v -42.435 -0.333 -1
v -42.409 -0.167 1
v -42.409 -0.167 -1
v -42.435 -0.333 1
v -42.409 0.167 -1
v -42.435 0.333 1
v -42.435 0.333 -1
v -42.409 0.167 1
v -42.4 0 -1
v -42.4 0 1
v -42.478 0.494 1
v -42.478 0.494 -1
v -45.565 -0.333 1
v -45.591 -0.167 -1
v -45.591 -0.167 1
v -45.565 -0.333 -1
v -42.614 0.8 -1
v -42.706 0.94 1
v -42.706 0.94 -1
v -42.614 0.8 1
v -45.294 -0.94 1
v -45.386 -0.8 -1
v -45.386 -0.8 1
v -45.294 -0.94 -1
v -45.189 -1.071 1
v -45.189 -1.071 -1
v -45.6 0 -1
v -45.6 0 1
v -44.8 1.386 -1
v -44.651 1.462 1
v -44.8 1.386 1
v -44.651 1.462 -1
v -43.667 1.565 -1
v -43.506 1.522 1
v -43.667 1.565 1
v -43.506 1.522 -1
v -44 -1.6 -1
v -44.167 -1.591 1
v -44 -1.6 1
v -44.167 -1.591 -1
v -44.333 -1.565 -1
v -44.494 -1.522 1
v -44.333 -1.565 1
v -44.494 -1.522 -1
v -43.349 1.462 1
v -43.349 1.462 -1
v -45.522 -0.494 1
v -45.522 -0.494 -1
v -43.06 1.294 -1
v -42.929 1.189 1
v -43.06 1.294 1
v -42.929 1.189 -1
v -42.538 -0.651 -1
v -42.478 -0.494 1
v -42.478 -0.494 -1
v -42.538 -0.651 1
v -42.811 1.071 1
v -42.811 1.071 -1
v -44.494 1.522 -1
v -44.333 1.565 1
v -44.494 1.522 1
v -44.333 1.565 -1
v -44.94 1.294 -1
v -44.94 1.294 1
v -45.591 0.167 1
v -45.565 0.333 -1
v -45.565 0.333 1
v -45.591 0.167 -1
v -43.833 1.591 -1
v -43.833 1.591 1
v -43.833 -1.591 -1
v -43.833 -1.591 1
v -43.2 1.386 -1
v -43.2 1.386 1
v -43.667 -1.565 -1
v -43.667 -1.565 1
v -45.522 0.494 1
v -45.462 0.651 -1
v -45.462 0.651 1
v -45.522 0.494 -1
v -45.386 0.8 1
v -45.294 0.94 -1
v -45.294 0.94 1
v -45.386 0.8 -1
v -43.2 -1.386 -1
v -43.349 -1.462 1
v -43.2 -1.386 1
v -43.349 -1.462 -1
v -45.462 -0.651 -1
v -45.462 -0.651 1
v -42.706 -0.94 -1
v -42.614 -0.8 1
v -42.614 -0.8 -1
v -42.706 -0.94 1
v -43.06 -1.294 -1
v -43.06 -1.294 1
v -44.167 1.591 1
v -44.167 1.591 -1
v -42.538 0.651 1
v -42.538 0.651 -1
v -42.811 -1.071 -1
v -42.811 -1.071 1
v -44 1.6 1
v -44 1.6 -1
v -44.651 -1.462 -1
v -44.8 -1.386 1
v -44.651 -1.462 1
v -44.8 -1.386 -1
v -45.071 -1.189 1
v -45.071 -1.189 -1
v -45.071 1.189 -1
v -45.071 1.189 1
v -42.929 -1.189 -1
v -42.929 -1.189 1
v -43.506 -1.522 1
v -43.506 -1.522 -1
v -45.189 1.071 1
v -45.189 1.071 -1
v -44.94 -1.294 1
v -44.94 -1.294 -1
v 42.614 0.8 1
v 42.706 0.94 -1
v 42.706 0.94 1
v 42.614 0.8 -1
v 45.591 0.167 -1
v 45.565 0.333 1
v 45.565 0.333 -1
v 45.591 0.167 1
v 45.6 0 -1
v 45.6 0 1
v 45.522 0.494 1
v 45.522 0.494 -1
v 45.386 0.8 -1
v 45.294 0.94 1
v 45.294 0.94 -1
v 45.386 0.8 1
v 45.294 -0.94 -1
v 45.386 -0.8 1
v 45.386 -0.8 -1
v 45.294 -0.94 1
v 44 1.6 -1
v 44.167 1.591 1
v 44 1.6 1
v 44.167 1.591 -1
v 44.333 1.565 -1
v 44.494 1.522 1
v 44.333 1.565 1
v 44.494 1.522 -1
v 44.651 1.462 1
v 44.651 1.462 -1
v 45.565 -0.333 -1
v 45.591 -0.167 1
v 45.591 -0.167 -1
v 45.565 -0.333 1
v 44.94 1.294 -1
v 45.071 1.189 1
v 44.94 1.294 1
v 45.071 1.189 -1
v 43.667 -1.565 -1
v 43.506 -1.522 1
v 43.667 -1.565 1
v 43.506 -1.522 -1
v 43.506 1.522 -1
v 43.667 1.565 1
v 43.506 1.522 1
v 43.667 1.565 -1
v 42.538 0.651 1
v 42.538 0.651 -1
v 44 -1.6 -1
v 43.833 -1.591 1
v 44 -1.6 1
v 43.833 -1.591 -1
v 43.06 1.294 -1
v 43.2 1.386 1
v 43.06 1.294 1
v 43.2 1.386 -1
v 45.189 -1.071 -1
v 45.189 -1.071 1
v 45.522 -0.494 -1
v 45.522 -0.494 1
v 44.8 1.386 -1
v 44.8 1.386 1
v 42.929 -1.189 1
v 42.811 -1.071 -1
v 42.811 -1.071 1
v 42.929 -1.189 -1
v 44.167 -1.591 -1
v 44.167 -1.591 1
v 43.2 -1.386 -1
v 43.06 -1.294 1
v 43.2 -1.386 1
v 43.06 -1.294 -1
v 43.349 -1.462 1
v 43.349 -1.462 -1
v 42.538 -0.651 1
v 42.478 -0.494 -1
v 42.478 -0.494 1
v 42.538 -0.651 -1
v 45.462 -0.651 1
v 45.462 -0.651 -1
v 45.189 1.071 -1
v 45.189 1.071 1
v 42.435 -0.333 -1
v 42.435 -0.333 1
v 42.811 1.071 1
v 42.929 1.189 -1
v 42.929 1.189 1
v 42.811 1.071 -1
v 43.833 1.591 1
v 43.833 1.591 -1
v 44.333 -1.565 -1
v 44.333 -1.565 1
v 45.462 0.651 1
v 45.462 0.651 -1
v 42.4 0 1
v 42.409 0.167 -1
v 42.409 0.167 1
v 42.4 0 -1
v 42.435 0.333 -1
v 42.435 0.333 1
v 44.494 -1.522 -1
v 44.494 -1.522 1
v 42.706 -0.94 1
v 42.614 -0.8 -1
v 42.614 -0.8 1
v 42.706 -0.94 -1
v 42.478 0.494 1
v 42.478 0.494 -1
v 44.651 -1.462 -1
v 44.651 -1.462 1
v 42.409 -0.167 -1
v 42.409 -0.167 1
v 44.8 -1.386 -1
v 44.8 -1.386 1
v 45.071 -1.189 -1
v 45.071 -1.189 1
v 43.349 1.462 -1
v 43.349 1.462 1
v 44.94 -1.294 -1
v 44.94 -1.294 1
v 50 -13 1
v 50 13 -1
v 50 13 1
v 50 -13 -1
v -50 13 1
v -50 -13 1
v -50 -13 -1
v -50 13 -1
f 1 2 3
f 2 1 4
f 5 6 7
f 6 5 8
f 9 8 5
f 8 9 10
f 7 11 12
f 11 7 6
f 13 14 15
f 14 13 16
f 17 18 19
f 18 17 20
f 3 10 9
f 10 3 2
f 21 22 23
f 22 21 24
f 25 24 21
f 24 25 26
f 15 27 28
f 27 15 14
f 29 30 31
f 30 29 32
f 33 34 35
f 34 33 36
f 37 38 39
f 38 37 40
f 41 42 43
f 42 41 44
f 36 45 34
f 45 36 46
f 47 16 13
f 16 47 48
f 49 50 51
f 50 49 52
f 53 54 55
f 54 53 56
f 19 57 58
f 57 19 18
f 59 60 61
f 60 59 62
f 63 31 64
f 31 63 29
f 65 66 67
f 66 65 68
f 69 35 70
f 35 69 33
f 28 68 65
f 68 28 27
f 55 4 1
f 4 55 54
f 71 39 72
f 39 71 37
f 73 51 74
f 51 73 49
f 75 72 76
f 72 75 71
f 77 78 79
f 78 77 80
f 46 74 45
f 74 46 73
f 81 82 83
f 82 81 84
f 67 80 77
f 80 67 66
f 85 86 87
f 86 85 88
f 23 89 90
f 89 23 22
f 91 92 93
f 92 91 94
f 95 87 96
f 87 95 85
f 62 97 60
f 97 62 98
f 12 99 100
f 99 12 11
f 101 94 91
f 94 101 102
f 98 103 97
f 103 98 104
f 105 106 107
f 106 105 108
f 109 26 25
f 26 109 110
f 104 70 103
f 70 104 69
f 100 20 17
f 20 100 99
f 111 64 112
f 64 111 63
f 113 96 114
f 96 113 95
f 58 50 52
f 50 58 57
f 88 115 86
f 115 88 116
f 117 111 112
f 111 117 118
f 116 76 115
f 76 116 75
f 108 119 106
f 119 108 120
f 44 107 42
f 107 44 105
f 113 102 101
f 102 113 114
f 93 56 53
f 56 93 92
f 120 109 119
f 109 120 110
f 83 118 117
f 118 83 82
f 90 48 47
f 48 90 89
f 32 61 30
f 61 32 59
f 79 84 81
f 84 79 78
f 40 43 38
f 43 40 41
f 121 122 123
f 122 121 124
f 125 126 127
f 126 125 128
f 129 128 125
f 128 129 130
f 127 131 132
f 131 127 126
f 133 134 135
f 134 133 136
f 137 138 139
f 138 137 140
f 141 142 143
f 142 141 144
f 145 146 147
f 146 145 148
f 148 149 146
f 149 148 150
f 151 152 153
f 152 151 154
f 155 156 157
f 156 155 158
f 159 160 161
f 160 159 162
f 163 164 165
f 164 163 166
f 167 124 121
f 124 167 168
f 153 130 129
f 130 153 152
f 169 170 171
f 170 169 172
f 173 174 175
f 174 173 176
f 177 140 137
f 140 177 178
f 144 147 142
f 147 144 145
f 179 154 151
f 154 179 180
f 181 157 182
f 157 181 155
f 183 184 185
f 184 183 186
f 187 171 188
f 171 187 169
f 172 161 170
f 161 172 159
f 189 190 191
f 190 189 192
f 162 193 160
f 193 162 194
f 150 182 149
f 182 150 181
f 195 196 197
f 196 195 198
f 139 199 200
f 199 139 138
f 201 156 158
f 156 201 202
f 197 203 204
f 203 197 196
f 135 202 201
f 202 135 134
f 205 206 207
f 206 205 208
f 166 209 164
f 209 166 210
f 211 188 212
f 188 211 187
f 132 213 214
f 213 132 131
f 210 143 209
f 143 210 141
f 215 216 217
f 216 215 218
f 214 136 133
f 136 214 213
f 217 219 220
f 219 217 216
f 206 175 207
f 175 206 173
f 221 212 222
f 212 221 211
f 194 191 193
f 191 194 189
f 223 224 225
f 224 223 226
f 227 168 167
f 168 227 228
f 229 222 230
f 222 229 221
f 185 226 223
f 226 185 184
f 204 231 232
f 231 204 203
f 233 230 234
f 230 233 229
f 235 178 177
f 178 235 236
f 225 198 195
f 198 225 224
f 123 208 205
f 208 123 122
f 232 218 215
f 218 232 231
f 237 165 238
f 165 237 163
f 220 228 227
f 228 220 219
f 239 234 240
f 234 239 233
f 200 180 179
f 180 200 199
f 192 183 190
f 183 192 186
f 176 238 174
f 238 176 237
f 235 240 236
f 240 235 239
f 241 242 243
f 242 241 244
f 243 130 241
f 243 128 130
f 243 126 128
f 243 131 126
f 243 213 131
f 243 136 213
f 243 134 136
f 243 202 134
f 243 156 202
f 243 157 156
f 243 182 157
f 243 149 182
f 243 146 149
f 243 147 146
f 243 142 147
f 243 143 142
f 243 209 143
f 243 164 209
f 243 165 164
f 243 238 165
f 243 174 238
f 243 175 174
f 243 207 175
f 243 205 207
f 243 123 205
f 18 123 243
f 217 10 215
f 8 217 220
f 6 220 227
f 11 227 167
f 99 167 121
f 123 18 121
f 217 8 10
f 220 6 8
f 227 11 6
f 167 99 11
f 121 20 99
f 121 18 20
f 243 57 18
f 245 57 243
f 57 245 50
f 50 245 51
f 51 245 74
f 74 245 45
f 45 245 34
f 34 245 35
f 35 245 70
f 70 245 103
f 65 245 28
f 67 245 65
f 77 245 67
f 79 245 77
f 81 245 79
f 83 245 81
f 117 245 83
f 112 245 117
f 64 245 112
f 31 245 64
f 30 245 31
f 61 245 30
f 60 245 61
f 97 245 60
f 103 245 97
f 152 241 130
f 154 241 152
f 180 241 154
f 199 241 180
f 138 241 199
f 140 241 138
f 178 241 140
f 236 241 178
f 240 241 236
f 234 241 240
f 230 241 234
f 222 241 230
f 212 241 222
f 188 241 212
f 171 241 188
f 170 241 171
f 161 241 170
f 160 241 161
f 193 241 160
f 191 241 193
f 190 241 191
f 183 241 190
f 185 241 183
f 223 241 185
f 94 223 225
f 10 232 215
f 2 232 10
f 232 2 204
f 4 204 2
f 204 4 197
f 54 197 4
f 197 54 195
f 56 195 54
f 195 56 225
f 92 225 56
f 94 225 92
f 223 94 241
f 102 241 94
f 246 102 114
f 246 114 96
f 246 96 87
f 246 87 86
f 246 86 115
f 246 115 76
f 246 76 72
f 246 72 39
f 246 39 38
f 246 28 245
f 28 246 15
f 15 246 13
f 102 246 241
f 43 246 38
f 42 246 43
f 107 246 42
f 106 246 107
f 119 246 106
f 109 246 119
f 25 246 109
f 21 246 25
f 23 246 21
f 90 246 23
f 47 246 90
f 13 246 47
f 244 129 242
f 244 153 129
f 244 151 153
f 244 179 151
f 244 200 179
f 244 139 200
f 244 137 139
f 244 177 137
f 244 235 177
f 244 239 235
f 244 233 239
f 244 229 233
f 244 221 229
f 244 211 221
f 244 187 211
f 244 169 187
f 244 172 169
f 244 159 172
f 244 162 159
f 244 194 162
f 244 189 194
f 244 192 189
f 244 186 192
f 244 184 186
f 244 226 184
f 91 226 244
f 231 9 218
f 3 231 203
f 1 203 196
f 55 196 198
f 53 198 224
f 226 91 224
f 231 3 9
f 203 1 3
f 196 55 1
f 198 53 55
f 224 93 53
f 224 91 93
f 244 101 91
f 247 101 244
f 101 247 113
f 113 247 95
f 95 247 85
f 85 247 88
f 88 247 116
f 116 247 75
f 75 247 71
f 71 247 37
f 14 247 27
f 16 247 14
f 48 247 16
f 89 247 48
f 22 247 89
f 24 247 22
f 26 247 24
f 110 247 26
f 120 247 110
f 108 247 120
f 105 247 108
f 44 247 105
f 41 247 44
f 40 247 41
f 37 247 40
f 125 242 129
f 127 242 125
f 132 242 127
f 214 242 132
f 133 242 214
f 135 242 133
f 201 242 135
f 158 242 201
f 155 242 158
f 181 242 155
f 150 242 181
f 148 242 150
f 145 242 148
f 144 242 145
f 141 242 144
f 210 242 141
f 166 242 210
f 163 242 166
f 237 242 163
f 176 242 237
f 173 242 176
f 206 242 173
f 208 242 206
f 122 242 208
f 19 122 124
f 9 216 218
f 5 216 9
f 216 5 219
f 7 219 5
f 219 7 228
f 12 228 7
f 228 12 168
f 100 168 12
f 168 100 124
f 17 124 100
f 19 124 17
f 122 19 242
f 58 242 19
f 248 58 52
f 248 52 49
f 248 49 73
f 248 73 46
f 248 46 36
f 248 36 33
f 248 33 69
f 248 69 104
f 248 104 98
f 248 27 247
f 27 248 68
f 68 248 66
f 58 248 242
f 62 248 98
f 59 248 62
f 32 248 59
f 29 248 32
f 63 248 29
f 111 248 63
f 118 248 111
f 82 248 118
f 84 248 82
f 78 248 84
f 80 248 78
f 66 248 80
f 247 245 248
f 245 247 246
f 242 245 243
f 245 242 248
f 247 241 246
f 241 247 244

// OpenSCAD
// Engraving-ready nameplate.
$fn = 60;
eps = 0.02;
length = 100;
width = 26;
thickness = 2;
difference() { cube([length,width,thickness],center=true); for(x=[-length/2+6,length/2-6]) translate([x,0,-thickness/2-eps]) cylinder(d=3.2,h=thickness+2*eps); }
